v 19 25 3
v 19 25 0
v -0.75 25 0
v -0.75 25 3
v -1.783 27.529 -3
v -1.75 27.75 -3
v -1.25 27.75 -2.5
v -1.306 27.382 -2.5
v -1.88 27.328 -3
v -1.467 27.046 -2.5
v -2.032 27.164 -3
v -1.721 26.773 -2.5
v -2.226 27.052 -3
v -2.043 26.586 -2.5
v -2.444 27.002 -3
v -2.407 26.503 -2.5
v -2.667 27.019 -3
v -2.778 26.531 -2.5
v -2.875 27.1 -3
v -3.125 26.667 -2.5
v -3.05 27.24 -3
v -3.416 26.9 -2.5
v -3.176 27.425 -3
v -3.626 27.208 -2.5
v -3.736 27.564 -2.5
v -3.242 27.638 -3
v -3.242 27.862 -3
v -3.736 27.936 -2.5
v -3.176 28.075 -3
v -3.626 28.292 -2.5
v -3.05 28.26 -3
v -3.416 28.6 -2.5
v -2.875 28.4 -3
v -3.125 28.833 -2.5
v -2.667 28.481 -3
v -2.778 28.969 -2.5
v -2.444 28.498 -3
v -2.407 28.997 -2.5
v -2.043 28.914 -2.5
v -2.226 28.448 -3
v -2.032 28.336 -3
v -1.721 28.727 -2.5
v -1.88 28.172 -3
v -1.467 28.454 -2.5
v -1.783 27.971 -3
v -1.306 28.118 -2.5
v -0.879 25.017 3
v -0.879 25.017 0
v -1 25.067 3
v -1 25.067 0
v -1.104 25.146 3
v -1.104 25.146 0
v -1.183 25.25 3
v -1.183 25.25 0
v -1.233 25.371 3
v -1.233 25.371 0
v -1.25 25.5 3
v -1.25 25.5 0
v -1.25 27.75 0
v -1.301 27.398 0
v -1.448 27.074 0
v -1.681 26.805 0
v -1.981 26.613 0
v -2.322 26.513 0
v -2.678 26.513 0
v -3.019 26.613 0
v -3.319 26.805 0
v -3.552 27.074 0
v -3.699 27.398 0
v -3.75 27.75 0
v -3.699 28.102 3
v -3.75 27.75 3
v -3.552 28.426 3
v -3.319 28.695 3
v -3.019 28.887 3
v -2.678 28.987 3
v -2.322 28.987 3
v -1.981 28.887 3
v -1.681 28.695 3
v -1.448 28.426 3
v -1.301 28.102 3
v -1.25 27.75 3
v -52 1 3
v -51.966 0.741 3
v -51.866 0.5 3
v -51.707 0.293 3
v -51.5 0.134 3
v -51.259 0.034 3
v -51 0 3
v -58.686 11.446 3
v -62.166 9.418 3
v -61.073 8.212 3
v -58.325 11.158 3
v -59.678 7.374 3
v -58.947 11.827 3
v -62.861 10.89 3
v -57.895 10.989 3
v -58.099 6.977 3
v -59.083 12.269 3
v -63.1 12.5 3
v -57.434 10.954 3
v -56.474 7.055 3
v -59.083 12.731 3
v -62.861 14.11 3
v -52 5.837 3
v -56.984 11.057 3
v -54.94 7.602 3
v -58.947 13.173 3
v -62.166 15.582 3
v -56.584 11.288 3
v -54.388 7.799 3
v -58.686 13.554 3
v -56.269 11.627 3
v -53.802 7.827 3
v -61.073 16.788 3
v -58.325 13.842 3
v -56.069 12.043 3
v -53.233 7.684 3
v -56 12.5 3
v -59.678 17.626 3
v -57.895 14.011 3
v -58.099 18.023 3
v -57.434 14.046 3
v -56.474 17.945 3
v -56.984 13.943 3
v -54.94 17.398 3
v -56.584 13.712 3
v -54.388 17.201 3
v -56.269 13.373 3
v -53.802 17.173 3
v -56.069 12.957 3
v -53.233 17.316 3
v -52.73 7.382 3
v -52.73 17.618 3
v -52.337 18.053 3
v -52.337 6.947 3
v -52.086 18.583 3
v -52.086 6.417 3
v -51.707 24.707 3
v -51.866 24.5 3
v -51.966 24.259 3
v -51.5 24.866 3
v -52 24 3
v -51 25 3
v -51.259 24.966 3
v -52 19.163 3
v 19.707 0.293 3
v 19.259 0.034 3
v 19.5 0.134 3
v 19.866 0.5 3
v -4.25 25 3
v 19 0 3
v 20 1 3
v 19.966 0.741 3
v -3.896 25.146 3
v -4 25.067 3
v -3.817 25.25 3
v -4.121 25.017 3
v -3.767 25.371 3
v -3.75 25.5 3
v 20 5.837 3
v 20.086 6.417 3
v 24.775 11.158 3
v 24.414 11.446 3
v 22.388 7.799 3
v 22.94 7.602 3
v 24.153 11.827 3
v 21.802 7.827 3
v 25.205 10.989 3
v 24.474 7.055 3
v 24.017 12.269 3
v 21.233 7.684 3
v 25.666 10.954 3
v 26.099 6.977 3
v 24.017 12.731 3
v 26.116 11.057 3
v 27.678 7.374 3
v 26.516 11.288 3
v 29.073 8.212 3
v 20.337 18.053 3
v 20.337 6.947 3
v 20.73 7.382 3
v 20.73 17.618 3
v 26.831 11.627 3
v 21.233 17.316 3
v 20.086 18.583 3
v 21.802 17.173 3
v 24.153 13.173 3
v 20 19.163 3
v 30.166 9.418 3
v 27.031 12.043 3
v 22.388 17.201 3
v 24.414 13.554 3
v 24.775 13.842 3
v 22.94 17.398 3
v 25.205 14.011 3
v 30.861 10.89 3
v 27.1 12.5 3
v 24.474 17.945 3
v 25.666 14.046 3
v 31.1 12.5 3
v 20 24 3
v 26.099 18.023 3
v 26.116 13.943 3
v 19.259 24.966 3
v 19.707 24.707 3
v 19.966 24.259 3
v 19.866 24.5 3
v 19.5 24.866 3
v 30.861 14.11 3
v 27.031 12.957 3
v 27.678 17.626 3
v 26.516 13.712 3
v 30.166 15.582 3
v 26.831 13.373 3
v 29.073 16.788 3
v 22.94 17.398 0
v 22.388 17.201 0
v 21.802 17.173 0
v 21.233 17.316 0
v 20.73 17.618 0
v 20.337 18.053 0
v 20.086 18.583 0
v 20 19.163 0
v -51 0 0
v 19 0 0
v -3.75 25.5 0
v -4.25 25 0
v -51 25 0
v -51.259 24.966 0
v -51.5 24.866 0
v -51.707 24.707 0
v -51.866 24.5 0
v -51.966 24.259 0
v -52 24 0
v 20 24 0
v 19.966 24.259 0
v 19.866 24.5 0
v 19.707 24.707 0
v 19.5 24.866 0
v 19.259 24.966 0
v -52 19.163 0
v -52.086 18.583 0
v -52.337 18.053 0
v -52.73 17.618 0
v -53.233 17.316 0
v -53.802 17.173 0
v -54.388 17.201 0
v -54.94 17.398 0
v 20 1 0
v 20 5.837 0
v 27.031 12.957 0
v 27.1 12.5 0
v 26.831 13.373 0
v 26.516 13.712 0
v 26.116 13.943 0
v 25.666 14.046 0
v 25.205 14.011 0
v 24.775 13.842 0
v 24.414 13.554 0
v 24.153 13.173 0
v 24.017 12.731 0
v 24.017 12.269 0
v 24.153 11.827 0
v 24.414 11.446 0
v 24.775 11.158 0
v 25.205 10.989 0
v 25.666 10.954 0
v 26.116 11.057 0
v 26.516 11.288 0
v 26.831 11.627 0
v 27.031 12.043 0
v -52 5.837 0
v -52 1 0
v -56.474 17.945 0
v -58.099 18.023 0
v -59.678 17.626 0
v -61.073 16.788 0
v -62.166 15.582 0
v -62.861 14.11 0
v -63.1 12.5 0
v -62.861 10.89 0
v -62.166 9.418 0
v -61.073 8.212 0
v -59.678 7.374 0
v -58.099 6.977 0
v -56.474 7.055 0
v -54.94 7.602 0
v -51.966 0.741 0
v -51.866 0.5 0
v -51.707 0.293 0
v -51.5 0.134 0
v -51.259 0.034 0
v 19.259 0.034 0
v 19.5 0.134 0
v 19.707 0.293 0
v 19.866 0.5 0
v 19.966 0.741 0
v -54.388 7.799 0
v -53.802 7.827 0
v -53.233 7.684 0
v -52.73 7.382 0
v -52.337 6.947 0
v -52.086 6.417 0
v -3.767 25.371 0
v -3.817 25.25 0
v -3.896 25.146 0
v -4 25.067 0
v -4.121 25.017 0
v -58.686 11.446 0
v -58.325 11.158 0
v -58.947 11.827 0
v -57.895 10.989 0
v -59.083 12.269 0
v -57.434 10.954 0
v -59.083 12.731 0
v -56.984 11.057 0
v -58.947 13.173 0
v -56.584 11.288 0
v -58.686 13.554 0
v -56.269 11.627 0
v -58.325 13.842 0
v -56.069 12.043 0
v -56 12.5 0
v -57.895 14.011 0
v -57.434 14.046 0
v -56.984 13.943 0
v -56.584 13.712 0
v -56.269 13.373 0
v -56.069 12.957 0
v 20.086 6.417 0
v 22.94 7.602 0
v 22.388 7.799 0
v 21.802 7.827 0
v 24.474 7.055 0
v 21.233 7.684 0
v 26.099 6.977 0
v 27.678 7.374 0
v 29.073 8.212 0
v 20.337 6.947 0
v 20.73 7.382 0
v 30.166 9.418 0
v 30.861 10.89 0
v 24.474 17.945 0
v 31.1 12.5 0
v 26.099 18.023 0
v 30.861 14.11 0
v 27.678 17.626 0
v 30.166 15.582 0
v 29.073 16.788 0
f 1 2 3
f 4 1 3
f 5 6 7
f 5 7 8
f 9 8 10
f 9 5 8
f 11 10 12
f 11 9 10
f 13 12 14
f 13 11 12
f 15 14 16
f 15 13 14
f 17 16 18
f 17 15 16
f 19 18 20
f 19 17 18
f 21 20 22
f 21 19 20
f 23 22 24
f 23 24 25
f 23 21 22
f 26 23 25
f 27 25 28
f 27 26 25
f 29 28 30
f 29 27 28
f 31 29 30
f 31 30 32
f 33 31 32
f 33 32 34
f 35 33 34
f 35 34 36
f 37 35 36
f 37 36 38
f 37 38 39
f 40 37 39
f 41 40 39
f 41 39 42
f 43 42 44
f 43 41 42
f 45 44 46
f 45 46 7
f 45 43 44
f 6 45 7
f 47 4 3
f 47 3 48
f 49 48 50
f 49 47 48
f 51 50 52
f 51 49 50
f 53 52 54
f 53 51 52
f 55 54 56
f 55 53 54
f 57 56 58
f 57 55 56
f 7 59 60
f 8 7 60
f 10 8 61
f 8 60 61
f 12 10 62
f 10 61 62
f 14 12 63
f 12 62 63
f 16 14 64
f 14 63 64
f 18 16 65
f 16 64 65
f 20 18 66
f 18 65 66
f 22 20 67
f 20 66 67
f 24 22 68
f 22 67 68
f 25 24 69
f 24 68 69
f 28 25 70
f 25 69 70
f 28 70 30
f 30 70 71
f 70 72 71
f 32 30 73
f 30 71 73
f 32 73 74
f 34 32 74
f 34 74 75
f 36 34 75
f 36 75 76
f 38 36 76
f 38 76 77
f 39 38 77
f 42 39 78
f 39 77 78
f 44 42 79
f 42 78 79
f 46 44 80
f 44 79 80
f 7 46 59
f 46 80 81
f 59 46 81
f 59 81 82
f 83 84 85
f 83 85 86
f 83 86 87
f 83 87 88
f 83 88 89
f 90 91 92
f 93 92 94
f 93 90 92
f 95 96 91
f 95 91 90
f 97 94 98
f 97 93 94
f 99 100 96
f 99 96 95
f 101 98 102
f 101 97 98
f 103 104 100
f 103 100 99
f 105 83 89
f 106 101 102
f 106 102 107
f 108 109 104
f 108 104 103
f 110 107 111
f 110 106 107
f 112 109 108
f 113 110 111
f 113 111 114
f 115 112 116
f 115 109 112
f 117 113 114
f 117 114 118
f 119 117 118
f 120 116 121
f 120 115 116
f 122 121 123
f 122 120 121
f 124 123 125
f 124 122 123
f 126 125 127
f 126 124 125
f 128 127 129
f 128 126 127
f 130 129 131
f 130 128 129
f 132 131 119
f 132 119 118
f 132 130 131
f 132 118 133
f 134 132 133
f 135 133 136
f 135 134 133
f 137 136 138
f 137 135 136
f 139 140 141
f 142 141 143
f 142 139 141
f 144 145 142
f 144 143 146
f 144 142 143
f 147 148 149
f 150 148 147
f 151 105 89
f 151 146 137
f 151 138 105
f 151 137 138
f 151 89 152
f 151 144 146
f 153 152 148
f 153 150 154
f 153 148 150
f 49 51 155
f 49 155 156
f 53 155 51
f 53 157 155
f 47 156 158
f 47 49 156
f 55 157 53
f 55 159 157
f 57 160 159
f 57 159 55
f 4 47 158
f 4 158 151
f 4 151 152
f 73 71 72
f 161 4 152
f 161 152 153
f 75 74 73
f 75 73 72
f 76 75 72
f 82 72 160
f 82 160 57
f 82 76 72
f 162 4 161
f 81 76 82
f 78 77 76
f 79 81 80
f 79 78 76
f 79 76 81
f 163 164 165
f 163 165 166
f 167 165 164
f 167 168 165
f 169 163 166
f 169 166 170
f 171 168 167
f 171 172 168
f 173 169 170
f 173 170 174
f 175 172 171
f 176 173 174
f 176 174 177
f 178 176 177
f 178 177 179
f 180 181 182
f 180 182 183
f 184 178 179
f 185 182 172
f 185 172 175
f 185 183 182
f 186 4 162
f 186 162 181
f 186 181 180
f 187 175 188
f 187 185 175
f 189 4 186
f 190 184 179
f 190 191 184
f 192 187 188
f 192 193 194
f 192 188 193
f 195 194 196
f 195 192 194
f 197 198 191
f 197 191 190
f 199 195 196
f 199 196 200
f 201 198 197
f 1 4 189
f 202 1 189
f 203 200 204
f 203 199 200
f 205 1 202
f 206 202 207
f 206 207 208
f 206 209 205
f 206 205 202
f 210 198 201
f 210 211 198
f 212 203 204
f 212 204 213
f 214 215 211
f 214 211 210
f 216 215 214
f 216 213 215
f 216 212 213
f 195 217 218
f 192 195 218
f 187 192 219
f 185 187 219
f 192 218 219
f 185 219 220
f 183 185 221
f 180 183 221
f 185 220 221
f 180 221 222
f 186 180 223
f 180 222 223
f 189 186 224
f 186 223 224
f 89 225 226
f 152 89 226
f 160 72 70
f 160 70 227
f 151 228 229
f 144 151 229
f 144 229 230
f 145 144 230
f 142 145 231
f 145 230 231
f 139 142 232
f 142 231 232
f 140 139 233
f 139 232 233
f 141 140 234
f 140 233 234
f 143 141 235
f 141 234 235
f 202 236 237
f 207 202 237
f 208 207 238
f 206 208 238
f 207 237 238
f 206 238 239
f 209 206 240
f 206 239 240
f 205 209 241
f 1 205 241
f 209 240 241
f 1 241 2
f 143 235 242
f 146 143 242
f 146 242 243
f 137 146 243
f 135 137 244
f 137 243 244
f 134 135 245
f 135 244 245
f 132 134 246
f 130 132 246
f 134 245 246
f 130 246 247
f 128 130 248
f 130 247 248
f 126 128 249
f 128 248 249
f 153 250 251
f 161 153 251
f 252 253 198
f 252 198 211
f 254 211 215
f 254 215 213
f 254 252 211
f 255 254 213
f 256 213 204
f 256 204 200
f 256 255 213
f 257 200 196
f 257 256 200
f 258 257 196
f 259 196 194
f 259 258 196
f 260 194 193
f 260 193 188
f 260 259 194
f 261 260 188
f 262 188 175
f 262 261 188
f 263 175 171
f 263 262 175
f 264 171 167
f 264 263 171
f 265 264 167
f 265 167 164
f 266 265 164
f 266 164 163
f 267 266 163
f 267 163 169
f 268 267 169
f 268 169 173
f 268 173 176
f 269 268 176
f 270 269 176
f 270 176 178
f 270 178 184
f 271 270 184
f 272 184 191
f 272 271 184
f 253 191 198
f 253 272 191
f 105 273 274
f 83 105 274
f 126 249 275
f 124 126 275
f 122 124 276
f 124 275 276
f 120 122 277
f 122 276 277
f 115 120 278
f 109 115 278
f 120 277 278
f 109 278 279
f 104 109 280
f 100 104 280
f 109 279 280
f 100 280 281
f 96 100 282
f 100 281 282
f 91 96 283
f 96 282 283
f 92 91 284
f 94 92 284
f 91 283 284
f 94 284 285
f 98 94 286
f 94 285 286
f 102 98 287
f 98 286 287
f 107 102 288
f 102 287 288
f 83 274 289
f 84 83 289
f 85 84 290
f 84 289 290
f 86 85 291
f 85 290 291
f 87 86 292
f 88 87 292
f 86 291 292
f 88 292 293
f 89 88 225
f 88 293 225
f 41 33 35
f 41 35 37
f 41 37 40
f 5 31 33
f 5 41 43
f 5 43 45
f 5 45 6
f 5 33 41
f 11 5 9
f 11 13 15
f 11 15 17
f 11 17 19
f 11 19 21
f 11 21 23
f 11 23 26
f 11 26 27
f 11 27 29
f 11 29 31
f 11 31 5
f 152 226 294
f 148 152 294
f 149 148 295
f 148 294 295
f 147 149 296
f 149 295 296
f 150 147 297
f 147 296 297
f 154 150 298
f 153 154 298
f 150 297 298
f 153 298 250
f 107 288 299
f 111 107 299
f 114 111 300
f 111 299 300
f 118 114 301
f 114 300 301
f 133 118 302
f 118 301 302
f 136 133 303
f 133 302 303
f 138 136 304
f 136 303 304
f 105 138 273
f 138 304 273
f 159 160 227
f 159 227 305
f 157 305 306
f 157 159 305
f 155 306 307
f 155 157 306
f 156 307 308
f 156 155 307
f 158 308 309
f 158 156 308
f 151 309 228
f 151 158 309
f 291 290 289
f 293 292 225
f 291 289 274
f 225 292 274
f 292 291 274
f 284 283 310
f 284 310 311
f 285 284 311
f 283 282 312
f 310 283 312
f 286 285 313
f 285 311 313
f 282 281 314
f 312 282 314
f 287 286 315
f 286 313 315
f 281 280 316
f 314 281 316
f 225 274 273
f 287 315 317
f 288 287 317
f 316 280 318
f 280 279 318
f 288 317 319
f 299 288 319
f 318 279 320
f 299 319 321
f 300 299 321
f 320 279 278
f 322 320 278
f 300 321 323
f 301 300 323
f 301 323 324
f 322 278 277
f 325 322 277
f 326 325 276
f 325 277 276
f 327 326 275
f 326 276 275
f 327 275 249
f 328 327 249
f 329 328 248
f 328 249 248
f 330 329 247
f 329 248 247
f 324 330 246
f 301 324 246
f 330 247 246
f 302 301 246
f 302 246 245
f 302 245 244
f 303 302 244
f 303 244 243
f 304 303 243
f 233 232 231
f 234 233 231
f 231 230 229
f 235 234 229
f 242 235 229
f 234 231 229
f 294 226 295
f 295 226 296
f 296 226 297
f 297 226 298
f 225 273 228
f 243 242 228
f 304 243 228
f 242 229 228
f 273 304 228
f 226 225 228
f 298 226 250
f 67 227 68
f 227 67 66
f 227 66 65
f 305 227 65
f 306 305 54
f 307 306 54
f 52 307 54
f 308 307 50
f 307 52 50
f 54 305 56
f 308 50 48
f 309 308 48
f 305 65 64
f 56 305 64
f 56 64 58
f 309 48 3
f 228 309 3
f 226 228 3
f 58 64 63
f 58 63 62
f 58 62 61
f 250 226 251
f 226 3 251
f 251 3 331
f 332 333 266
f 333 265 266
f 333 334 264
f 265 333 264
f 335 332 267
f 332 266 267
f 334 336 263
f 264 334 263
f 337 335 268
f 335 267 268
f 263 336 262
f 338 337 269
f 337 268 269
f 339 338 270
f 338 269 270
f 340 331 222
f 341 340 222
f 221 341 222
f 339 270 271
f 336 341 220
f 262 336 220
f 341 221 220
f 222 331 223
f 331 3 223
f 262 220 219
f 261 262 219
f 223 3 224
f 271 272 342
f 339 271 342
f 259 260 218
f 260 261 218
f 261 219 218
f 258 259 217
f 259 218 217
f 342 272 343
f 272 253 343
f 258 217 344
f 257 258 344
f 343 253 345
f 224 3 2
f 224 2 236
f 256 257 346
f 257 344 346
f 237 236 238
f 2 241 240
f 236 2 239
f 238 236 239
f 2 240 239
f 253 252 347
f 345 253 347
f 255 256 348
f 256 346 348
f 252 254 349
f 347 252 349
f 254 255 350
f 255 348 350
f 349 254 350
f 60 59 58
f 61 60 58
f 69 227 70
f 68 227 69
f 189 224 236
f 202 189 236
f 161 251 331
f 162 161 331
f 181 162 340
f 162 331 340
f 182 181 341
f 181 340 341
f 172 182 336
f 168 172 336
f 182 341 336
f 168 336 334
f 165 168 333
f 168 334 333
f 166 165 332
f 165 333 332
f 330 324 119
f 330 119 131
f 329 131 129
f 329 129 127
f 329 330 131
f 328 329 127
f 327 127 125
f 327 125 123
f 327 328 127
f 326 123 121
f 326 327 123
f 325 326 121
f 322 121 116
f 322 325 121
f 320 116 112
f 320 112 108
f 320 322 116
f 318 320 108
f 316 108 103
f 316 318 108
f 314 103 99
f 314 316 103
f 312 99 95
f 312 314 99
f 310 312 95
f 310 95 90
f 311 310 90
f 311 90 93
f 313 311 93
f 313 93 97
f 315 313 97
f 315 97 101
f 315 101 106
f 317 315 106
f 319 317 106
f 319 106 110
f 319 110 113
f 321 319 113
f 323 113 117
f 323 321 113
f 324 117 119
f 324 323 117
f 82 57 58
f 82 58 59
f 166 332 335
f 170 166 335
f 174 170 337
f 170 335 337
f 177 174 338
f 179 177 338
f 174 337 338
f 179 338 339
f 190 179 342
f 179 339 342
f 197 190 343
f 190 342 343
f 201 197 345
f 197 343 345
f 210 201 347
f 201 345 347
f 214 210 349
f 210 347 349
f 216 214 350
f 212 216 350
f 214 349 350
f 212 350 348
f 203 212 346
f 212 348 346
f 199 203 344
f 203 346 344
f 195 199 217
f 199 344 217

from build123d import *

# Parameters (mm, degrees)
F0_R     = 1.55
F1_DEPTH = 3
F3_DEPTH = 3
F4_R     = 1.25
F5_DEPTH = 3
F6_SIZE  = 0.5


with BuildPart() as f1:
    # F0 (on Top) → F1 (new body)
    with BuildSketch(Plane.XY):
        with BuildLine():
            Line((19, 25), (-51, 25))
            ThreePointArc((-51, 25), (-51.707107, 24.707107), (-52, 24))
            Line((-52, 24), (-52, 19.163332))
            Line((-52, 19.163332), (-52, 5.836668))
            Line((-52, 5.836668), (-52, 1))
            ThreePointArc((-52, 1), (-51.707107, 0.292893), (-51, 0))
            Line((-51, 0), (19, 0))
            ThreePointArc((19, 0), (19.707107, 0.292893), (20, 1))
            Line((20, 1), (20, 5.836668))
            Line((20, 5.836668), (20, 19.163332))
            Line((20, 19.163332), (20, 24))
            ThreePointArc((20, 24), (19.707107, 24.707107), (19, 25))
        make_face()
        with BuildLine():
            Line((-52, 5.836668), (-52, 19.163332))
            ThreePointArc((-52, 19.163332), (-52.97063, 17.448574), (-54.940397, 17.398211))
            ThreePointArc((-54.940397, 17.398211), (-63.1, 12.5), (-54.940397, 7.601789))
            ThreePointArc((-54.940397, 7.601789), (-52.97063, 7.551426), (-52, 5.836668))
        make_face()
        with Locations((-57.55, 12.5)):
            Circle(F0_R, mode=Mode.SUBTRACT)
        with BuildLine():
            ThreePointArc((22.940397, 17.398211), (20.97063, 17.448574), (20, 19.163332))
            Line((20, 19.163332), (20, 5.836668))
            ThreePointArc((20, 5.836668), (20.97063, 7.551426), (22.940397, 7.601789))
            ThreePointArc((22.940397, 7.601789), (31.1, 12.5), (22.940397, 17.398211))
        make_face()
        with Locations((25.55, 12.5)):
            Circle(F0_R, mode=Mode.SUBTRACT)
    extrude(amount=F1_DEPTH)

    # F2 (on face) → F3 (join, through all)
    with BuildSketch(Plane.XY.offset(3)):
        with BuildLine():
            Line((-4.25, 25), (-3.75, 25))
            Line((-3.75, 25), (-1.25, 25))
            Line((-1.25, 25), (-0.75, 25))
            ThreePointArc((-0.75, 25), (-1.103553, 25.146447), (-1.25, 25.5))
            Line((-1.25, 25.5), (-1.25, 27.75))
            ThreePointArc((-1.25, 27.75), (-2.5, 29), (-3.75, 27.75))
            Line((-3.75, 27.75), (-3.75, 25.5))
            ThreePointArc((-3.75, 25.5), (-3.896447, 25.146447), (-4.25, 25))
        make_face()
    extrude(amount=-F3_DEPTH)

    # F4 (on face) → F5 (join)
    with BuildSketch(Plane(origin=(0, 0, 0), x_dir=(1, 0, 0), z_dir=(0, 0, -1))):
        with Locations((-2.5, -27.75)):
            Circle(F4_R)
    extrude(amount=F5_DEPTH)

    # F6
    f6_edges = [f1.edges().sort_by_distance(p)[0] for p in [
        (-3.75, 27.75, -3),
    ]]
    chamfer(f6_edges, length=F6_SIZE)


solid = f1.part
